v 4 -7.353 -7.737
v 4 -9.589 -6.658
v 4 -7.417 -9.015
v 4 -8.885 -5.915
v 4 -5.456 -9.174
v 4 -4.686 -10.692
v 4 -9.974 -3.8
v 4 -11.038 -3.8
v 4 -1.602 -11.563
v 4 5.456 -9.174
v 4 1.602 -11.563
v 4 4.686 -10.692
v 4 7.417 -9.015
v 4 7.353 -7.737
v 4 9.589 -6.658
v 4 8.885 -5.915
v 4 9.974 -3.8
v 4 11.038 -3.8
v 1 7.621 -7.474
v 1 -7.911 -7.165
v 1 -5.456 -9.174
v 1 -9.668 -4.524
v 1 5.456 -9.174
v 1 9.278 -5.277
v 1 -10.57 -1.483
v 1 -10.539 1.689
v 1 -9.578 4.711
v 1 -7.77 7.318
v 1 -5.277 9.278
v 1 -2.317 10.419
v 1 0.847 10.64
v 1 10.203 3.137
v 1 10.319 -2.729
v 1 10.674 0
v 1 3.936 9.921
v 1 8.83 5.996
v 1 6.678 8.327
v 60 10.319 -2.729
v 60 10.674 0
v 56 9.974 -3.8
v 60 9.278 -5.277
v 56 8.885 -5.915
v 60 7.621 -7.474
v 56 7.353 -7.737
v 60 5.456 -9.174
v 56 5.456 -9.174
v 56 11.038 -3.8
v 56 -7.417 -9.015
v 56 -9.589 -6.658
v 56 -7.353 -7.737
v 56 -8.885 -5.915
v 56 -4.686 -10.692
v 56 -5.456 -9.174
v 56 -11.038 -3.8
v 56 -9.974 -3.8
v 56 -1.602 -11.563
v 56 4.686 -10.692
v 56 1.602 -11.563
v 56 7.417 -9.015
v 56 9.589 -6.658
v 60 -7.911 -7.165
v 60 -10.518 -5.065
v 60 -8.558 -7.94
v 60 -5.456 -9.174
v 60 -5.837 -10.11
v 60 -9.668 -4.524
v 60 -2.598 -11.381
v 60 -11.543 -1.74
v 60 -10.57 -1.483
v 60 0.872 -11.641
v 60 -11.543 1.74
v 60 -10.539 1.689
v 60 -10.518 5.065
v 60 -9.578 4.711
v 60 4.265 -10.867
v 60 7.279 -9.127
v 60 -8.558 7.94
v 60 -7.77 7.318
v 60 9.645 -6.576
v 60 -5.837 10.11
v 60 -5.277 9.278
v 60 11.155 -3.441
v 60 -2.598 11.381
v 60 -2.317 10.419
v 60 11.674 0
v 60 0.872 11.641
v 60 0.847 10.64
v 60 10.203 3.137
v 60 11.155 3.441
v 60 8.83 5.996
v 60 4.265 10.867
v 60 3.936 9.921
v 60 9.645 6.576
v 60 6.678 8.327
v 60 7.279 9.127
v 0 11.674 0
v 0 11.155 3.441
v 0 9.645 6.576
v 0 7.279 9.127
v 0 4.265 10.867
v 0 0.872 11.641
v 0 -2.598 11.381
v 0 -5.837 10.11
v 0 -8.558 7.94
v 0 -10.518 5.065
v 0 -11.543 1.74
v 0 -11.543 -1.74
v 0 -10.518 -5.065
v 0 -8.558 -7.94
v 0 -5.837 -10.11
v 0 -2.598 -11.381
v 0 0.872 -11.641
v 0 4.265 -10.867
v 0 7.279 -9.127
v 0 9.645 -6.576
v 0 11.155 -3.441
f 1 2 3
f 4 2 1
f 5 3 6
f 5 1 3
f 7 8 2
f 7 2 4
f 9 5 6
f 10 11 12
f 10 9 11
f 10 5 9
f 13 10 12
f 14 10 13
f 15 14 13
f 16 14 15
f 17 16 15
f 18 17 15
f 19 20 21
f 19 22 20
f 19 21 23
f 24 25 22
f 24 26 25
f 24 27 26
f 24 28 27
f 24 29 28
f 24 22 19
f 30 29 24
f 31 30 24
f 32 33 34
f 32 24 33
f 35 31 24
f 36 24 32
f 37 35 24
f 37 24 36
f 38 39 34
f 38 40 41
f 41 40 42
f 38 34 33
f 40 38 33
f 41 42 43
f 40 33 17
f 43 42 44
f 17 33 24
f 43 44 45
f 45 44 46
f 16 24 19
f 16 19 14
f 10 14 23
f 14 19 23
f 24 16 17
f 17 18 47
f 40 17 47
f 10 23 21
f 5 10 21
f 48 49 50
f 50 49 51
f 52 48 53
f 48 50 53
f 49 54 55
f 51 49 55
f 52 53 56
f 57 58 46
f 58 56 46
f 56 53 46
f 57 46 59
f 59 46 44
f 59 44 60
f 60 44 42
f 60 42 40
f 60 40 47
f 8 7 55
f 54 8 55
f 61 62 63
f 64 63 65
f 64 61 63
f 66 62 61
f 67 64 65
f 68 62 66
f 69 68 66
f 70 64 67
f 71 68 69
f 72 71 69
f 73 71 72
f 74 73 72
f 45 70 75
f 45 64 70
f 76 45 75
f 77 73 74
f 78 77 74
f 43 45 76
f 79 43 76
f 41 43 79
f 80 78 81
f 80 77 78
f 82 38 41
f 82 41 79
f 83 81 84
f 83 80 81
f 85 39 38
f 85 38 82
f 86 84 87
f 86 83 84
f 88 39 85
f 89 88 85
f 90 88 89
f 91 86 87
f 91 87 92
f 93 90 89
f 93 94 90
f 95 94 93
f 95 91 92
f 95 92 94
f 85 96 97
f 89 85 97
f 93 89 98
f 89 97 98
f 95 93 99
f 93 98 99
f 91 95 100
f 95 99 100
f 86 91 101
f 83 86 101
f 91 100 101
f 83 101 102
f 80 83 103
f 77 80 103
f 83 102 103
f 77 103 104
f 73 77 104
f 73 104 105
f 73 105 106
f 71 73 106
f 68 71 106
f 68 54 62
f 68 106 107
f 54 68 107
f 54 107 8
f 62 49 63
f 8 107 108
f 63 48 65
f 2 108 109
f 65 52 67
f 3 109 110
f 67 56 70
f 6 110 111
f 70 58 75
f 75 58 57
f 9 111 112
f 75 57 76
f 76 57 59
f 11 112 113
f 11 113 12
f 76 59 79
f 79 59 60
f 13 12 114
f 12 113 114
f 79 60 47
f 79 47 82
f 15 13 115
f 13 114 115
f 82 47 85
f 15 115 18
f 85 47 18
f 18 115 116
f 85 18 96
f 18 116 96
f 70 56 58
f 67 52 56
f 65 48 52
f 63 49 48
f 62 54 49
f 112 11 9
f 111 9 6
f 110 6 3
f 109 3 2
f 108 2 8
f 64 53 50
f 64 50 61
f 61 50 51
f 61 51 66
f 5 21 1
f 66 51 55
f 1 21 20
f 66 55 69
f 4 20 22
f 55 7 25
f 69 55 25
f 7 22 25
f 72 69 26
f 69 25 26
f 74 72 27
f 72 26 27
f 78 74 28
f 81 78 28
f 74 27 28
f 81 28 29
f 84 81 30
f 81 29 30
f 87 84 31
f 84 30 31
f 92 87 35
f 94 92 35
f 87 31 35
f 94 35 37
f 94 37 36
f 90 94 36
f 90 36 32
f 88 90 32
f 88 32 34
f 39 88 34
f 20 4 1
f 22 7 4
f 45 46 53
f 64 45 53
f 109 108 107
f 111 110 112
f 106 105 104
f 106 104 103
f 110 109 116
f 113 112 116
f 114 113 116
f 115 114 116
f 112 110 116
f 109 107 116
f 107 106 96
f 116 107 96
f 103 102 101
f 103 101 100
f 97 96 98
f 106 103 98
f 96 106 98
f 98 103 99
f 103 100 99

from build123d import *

# Parameters (mm, degrees)
F0_R     = 11.673828125
F1_DEPTH = 60
F3_START = -3.8
F2_W     = 52
F2_H     = 28.3295102417
F3_DEPTH = 9.3
F4_R     = 11.673828125
F5_DEPTH = 1


with BuildPart() as f1:
    # F0 (on Right) → F1 (new body)
    with BuildSketch(Plane.YZ):
        Circle(F0_R)
        with BuildLine():
            ThreePointArc((-5.4563251713, -9.173828125), (-5.2768707474, 9.2782132955), (10.673828125, 0))
            ThreePointArc((10.673828125, 0), (9.2782132955, -5.2768707474), (5.4563251713, -9.173828125))
            ThreePointArc((5.4563251713, -9.173828125), (0, -10.673828125), (-5.4563251713, -9.173828125))
        make_face(mode=Mode.SUBTRACT)
        with BuildLine():
            Line((5.4563251713, -9.173828125), (-5.4563251713, -9.173828125))
            ThreePointArc((-5.4563251713, -9.173828125), (0, -10.673828125), (5.4563251713, -9.173828125))
        make_face()
    extrude(amount=F1_DEPTH)

    # F2 (on Top) → F3 (cut)
    with BuildSketch(Plane.XY.offset(F3_START)):
        with Locations((30, 0)):
            Rectangle(F2_W, F2_H)
    extrude(amount=-F3_DEPTH, mode=Mode.SUBTRACT)

    # F4 (on face) → F5 (join)
    with BuildSketch(Plane.YZ):
        Circle(F4_R)
    extrude(amount=F5_DEPTH)


solid = f1.part
